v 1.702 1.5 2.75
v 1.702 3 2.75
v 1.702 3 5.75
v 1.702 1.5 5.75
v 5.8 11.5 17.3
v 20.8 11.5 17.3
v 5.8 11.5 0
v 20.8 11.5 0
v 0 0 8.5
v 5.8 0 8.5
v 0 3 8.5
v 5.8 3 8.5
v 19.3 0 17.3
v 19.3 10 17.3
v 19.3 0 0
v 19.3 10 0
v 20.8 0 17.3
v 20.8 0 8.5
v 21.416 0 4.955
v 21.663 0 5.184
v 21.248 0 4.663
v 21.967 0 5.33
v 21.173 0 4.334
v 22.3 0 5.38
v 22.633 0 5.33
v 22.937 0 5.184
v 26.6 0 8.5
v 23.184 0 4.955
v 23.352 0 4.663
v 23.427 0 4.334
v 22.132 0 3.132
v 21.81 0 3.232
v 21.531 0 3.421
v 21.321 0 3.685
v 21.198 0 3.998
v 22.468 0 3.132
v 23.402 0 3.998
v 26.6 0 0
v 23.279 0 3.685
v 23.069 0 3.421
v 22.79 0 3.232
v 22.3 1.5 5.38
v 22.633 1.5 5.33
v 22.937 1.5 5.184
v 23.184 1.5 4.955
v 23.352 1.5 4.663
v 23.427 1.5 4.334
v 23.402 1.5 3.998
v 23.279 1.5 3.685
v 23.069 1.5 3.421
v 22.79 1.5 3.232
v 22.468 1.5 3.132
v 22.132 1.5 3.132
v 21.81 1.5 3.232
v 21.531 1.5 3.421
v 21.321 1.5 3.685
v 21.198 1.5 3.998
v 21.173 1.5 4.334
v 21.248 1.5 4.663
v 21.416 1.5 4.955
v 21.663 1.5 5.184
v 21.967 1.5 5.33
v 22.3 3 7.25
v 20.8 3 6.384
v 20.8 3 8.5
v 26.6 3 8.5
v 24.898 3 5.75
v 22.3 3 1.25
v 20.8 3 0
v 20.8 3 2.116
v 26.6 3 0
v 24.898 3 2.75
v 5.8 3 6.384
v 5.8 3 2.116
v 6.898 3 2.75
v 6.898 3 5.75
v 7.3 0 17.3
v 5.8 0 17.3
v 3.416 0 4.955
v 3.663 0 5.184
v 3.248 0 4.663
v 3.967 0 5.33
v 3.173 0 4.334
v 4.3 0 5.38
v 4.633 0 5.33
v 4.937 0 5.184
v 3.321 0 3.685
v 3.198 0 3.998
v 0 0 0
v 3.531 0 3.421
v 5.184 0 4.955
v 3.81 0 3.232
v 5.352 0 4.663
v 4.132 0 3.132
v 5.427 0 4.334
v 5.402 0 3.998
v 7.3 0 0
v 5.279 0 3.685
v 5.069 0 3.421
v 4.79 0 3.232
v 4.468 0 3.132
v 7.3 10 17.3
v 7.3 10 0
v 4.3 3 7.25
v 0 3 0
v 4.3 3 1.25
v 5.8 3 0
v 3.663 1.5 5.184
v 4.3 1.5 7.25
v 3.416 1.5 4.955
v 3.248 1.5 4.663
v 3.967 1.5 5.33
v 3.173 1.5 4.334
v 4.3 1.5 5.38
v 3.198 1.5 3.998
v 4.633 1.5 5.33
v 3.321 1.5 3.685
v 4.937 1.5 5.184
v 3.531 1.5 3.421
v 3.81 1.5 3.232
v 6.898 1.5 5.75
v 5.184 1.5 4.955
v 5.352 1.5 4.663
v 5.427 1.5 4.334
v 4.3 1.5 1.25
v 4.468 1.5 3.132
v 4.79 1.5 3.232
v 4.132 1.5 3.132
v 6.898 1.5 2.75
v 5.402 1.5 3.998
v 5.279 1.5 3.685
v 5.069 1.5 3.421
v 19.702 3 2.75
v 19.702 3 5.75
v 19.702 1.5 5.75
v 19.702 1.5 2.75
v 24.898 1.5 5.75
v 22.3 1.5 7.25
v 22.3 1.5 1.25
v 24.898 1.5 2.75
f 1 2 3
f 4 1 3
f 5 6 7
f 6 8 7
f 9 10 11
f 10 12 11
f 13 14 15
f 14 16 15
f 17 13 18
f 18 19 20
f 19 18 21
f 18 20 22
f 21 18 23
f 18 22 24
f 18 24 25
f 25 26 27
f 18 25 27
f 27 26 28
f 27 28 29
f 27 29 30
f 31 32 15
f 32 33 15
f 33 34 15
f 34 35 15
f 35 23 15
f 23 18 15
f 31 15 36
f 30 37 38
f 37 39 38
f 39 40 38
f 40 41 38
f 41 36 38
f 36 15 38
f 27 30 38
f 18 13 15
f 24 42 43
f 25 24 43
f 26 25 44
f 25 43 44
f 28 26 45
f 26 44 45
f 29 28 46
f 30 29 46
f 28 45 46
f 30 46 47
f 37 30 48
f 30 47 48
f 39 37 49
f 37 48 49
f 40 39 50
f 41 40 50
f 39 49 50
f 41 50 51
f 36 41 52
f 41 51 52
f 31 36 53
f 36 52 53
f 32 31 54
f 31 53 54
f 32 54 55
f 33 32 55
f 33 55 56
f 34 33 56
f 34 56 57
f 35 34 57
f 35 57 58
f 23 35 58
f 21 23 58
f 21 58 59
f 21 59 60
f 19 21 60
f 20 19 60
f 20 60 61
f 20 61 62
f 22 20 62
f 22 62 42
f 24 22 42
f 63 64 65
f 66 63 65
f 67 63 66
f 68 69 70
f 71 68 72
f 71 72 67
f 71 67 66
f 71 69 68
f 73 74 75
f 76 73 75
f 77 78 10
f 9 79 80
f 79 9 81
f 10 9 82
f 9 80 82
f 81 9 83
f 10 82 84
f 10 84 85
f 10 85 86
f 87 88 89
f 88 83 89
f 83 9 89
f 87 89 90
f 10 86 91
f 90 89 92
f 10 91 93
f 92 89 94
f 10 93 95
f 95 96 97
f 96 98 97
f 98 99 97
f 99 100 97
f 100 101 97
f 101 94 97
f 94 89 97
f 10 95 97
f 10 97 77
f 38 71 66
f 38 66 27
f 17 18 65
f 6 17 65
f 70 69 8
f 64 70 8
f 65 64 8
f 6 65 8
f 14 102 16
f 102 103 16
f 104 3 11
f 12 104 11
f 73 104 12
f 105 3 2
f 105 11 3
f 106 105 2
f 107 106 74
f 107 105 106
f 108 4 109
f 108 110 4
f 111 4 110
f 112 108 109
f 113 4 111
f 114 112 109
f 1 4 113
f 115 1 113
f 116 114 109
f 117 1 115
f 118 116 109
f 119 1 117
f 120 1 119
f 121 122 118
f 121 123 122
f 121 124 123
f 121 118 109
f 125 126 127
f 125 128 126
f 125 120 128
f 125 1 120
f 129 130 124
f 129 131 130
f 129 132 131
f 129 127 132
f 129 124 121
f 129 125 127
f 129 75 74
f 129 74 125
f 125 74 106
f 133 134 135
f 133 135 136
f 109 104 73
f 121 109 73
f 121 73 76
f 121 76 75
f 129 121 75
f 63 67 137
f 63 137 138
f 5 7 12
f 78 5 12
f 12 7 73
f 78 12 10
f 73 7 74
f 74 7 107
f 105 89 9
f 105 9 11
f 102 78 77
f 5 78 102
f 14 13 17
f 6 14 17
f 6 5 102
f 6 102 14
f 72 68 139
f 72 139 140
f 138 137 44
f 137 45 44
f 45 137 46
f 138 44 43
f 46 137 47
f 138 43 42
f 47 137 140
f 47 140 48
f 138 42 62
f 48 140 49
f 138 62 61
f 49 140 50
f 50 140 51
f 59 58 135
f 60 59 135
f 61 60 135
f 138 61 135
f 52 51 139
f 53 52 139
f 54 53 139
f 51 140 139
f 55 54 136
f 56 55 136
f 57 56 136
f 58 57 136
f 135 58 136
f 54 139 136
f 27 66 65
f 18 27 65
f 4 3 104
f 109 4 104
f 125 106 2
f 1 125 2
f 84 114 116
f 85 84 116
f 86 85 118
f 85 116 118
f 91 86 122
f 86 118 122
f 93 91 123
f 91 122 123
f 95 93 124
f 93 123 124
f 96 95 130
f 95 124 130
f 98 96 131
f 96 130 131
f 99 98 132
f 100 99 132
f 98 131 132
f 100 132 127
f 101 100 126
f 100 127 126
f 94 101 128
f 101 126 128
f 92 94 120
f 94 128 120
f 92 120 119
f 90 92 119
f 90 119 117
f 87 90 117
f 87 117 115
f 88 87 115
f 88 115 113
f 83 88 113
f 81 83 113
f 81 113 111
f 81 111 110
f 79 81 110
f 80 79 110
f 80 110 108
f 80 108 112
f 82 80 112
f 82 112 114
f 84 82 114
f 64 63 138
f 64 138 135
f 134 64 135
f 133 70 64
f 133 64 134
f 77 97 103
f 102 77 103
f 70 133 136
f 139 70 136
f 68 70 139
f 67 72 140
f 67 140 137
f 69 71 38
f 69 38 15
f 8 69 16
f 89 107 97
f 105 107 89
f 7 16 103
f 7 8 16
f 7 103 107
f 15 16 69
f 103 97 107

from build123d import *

# Parameters (mm, degrees)
BOSS_EXTRUDE4_DEPTH = 8.5
BOSS_EXTRUDE5_DEPTH = 8.8
CUT_EXTRUDE1_DEPTH  = 1.5
CUT_EXTRUDE2_REACH  = 35.269
SKETCH7_R           = 1.1303


with BuildPart() as part:
    # Sketch4 → Boss-Extrude4 (new body)
    with BuildSketch(Plane.XY):
        Polygon((0, 0), (0, 3), (5.8, 3), (5.8, 11.5), (20.8, 11.5), (20.8, 3), (26.6, 3), (26.6, 0), (19.3, 0), (19.3, 10), (7.3, 10), (7.3, 0), align=None)
    extrude(amount=BOSS_EXTRUDE4_DEPTH)

    # Sketch5 → Boss-Extrude5 (add)
    with BuildSketch(Plane.XY.offset(8.5)):
        Polygon((7.3, 0), (7.3, 10), (19.3, 10), (19.3, 0), (20.8, 0), (20.8, 11.5), (5.8, 11.5), (5.8, 0), align=None)
    extrude(amount=BOSS_EXTRUDE5_DEPTH)

    # Sketch6 → Cut-Extrude1 (cut)
    with BuildSketch(Plane(origin=(0, 3, 0), x_dir=(1, 0, 0), z_dir=(0, 1, 0))):
        Polygon((24.898076211, -5.75), (22.3, -7.25), (19.701923789, -5.75), (19.701923789, -2.75), (22.3, -1.25), (24.898076211, -2.75), align=None)
        Polygon((4.3, -7.25), (6.898076211, -5.75), (6.898076211, -2.75), (4.3, -1.25), (1.701923789, -2.75), (1.701923789, -5.75), align=None)
    extrude(amount=-CUT_EXTRUDE1_DEPTH, mode=Mode.SUBTRACT)

    # Sketch7 → Cut-Extrude2 (cut, up to next)
    with BuildSketch(Plane(origin=(0, 1.5, 0), x_dir=(1, 0, 0), z_dir=(0, 1, 0)), mode=Mode.PRIVATE) as cut_extrude2_sk1:
        with Locations(Location((4.3, -4.25, 0), (0, 0, 270))):
            Circle(SKETCH7_R)
    cut_extrude2_tool1 = extrude(cut_extrude2_sk1.sketch, amount=-CUT_EXTRUDE2_REACH, mode=Mode.PRIVATE) & part.part
    # Sketch7 → Cut-Extrude2 (cut, up to next)
    with BuildSketch(Plane(origin=(0, 1.5, 0), x_dir=(1, 0, 0), z_dir=(0, 1, 0)), mode=Mode.PRIVATE) as cut_extrude2_sk2:
        with Locations(Location((22.3, -4.25, 0), (0, 0, 270))):
            Circle(SKETCH7_R)
    cut_extrude2_tool2 = extrude(cut_extrude2_sk2.sketch, amount=-CUT_EXTRUDE2_REACH, mode=Mode.PRIVATE) & part.part
    add(cut_extrude2_tool1.solids().sort_by_distance((4.3, 1.5, 4.25))[0], mode=Mode.SUBTRACT)
    add(cut_extrude2_tool2.solids().sort_by_distance((22.3, 1.5, 4.25))[0], mode=Mode.SUBTRACT)


solid = part.part
